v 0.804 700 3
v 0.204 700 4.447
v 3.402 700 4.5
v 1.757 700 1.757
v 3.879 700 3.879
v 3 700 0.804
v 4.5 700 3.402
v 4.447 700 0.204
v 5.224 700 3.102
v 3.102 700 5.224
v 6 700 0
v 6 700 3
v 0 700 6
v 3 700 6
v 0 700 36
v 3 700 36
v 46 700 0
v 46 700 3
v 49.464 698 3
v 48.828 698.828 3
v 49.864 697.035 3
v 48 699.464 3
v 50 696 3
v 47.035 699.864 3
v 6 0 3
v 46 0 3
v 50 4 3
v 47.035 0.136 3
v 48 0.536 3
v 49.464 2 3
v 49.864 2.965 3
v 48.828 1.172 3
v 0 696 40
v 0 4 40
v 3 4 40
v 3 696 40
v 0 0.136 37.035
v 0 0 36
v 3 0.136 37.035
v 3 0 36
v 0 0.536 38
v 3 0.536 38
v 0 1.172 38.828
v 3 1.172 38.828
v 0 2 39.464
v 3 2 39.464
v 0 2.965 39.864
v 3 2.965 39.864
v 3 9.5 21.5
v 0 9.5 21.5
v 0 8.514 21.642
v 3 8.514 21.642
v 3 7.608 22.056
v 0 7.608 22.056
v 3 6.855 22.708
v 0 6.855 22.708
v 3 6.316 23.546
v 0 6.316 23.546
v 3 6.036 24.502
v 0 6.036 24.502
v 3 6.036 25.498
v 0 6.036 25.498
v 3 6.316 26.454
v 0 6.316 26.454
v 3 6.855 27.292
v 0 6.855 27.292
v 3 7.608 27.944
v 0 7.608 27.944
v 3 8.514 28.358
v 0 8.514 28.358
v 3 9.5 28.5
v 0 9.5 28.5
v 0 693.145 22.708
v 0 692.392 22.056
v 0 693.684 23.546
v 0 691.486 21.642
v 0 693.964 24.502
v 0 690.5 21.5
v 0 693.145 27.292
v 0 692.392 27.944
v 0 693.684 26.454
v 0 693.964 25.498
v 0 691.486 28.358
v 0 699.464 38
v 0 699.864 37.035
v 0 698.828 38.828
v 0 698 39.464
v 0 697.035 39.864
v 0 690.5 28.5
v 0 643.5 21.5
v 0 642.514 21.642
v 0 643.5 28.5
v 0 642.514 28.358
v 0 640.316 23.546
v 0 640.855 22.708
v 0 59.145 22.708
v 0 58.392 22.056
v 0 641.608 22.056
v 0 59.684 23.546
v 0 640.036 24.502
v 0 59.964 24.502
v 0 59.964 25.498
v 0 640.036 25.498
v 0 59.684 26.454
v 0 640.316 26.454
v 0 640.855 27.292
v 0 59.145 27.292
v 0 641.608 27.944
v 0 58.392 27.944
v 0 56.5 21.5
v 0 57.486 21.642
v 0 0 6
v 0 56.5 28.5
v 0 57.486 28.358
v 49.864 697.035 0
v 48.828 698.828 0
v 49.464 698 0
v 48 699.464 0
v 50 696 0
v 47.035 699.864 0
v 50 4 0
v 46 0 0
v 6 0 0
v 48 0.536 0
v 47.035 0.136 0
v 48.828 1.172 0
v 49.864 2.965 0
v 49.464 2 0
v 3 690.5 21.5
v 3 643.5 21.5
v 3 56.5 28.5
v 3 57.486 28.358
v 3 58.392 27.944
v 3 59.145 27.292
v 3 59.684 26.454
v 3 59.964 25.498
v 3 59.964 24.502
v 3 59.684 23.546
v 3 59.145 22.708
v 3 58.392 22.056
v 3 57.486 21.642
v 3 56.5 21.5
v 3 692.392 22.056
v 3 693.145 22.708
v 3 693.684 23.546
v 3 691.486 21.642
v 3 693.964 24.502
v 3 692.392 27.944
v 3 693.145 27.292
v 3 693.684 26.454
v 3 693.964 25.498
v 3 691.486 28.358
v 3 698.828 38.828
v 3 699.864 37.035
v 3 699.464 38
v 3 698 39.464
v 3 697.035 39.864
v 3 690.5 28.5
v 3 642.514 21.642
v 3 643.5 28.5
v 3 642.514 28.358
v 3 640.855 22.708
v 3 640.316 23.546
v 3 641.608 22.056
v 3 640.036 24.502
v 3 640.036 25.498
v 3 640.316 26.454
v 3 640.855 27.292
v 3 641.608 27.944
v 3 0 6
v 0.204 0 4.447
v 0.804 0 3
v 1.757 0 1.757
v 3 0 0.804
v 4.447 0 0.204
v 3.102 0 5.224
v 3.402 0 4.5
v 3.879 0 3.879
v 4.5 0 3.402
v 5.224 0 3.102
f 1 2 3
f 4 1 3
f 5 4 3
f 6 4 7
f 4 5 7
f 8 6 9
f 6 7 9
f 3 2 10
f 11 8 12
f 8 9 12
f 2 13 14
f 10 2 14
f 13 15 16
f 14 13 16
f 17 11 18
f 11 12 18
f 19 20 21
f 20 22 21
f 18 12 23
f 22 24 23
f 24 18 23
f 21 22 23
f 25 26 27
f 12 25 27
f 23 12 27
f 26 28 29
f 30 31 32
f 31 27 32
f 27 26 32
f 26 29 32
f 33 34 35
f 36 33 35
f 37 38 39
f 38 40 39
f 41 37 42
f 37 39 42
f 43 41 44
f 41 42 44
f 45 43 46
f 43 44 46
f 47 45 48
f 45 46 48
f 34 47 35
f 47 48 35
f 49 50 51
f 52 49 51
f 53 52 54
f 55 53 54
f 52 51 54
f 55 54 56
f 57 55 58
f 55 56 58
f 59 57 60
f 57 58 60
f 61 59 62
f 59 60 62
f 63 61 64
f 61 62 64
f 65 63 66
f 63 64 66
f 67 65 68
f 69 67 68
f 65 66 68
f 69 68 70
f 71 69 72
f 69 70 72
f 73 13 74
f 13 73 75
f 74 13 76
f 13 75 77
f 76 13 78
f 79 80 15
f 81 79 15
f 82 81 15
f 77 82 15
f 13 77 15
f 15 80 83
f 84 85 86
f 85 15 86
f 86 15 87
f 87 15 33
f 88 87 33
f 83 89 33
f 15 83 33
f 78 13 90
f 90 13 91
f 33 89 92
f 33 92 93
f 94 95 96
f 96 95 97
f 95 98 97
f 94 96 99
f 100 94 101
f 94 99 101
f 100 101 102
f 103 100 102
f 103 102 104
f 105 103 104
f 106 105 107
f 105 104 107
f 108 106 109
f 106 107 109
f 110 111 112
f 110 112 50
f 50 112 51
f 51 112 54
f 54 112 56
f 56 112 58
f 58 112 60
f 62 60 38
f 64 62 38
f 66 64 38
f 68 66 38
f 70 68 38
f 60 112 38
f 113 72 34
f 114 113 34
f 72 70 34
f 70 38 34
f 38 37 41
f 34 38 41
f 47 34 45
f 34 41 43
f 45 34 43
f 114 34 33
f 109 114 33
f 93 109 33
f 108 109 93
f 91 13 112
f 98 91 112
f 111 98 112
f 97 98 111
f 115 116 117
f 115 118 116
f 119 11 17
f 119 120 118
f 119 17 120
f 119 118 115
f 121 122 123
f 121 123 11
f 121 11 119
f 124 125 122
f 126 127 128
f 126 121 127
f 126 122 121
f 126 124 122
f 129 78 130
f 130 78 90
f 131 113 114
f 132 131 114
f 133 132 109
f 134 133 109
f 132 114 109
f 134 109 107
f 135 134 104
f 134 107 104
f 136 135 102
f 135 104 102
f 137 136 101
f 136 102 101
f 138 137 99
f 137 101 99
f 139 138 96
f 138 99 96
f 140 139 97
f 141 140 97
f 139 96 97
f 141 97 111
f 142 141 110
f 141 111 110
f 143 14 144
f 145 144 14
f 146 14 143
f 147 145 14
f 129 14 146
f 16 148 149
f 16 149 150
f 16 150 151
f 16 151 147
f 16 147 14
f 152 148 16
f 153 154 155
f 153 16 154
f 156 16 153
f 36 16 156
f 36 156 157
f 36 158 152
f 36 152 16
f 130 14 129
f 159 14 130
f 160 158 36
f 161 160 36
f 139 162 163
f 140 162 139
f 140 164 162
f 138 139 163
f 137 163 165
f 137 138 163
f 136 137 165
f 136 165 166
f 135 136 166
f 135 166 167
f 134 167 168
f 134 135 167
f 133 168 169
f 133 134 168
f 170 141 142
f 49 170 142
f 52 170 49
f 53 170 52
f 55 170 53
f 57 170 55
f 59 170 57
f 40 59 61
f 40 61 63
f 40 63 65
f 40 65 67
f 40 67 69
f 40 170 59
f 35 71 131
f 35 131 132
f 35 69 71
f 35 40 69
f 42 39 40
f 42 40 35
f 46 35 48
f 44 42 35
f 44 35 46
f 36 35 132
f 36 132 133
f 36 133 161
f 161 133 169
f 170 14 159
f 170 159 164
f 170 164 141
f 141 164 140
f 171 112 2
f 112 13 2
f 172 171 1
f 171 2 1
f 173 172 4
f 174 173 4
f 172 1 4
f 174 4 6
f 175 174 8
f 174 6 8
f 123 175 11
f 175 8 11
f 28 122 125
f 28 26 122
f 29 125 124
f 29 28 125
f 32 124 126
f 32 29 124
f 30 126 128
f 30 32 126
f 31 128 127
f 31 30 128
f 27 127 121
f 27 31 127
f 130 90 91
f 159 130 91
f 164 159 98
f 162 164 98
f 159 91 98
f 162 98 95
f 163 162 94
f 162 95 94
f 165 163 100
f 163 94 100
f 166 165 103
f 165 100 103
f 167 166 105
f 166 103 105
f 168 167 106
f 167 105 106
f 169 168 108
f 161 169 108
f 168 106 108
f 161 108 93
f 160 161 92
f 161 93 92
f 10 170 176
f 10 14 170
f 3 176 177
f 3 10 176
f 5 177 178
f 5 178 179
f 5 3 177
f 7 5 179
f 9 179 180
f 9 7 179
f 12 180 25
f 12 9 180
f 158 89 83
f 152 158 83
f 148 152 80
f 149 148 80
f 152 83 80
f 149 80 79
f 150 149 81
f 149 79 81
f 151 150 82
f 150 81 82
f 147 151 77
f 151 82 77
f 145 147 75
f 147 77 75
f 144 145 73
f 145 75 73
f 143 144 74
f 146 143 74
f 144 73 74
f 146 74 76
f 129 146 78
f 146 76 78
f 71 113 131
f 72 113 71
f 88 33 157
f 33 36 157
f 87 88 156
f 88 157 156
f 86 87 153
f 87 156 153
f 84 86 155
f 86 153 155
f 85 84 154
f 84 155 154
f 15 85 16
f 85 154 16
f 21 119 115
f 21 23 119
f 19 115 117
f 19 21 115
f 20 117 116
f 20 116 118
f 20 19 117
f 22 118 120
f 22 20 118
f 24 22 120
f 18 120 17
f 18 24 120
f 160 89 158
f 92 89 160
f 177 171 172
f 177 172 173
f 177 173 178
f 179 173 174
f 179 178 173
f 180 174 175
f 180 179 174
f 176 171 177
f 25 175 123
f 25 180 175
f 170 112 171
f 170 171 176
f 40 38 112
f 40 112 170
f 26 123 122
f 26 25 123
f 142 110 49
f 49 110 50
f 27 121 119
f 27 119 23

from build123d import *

# Parameters (mm, degrees)
F0_W      = 50
F0_H      = 40
F2_DEPTH  = 700
F1_W      = 47
F1_H      = 37
F3_DEPTH  = 700
F4_R      = 6
F5_R      = 3
F6_R      = 4
F7_R      = 4
F8_R      = 4
F9_R      = 4
F10_W     = 47
F10_H     = 7
F11_DEPTH = 3
F12_W     = 47
F12_H     = 7
F13_DEPTH = 3


with BuildPart() as f2:
    # F0 (on Front) → F2 (new body)
    with BuildSketch(Plane.XZ):
        with Locations((25, 20)):
            Rectangle(F0_W, F0_H)
    extrude(amount=-F2_DEPTH)

    # F1 (on face) → F3 (cut)
    with BuildSketch(Plane.XZ):
        with Locations((26.5, 21.5)):
            Rectangle(F1_W, F1_H)
    extrude(amount=-F3_DEPTH, mode=Mode.SUBTRACT)

    # F4
    f4_edges = [f2.edges().sort_by_distance(p)[0] for p in [
        (0, 350, 0),
    ]]
    fillet(f4_edges, radius=F4_R)

    # F5
    f5_edges = [f2.edges().sort_by_distance(p)[0] for p in [
        (3, 350, 3),
    ]]
    fillet(f5_edges, radius=F5_R)

    # F6
    f6_edges = [f2.edges().sort_by_distance(p)[0] for p in [
        (1.5, 0, 40),
    ]]
    fillet(f6_edges, radius=F6_R)

    # F7
    f7_edges = [f2.edges().sort_by_distance(p)[0] for p in [
        (1.5, 700, 40),
    ]]
    fillet(f7_edges, radius=F7_R)

    # F8
    f8_edges = [f2.edges().sort_by_distance(p)[0] for p in [
        (50, 0, 1.5),
    ]]
    fillet(f8_edges, radius=F8_R)

    # F9
    f9_edges = [f2.edges().sort_by_distance(p)[0] for p in [
        (50, 700, 1.5),
    ]]
    fillet(f9_edges, radius=F9_R)

    # F10 (on face) → F11 (cut)
    with BuildSketch(Plane(origin=(0, 0, 0), x_dir=(0, -1, 0), z_dir=(-1, 0, 0))):
        with Locations((-667, 25)):
            Rectangle(F10_W, F10_H)
        with BuildLine():
            Line((-690.5, 21.5), (-690.5, 28.5))
            ThreePointArc((-690.5, 28.5), (-694, 25), (-690.5, 21.5))
        make_face()
        with BuildLine():
            ThreePointArc((-643.5, 21.5), (-640, 25), (-643.5, 28.5))
            Line((-643.5, 28.5), (-643.5, 21.5))
        make_face()
    extrude(amount=-F11_DEPTH, mode=Mode.SUBTRACT)

    # F12 (on face) → F13 (cut)
    with BuildSketch(Plane(origin=(0, 0, 0), x_dir=(0, -1, 0), z_dir=(-1, 0, 0))):
        with Locations((-33, 25)):
            Rectangle(F12_W, F12_H)
        with BuildLine():
            Line((-56.5, 21.5), (-56.5, 28.5))
            ThreePointArc((-56.5, 28.5), (-60, 25), (-56.5, 21.5))
        make_face()
        with BuildLine():
            ThreePointArc((-9.5, 21.5), (-6, 25), (-9.5, 28.5))
            Line((-9.5, 28.5), (-9.5, 21.5))
        make_face()
    extrude(amount=-F13_DEPTH, mode=Mode.SUBTRACT)


solid = f2.part
